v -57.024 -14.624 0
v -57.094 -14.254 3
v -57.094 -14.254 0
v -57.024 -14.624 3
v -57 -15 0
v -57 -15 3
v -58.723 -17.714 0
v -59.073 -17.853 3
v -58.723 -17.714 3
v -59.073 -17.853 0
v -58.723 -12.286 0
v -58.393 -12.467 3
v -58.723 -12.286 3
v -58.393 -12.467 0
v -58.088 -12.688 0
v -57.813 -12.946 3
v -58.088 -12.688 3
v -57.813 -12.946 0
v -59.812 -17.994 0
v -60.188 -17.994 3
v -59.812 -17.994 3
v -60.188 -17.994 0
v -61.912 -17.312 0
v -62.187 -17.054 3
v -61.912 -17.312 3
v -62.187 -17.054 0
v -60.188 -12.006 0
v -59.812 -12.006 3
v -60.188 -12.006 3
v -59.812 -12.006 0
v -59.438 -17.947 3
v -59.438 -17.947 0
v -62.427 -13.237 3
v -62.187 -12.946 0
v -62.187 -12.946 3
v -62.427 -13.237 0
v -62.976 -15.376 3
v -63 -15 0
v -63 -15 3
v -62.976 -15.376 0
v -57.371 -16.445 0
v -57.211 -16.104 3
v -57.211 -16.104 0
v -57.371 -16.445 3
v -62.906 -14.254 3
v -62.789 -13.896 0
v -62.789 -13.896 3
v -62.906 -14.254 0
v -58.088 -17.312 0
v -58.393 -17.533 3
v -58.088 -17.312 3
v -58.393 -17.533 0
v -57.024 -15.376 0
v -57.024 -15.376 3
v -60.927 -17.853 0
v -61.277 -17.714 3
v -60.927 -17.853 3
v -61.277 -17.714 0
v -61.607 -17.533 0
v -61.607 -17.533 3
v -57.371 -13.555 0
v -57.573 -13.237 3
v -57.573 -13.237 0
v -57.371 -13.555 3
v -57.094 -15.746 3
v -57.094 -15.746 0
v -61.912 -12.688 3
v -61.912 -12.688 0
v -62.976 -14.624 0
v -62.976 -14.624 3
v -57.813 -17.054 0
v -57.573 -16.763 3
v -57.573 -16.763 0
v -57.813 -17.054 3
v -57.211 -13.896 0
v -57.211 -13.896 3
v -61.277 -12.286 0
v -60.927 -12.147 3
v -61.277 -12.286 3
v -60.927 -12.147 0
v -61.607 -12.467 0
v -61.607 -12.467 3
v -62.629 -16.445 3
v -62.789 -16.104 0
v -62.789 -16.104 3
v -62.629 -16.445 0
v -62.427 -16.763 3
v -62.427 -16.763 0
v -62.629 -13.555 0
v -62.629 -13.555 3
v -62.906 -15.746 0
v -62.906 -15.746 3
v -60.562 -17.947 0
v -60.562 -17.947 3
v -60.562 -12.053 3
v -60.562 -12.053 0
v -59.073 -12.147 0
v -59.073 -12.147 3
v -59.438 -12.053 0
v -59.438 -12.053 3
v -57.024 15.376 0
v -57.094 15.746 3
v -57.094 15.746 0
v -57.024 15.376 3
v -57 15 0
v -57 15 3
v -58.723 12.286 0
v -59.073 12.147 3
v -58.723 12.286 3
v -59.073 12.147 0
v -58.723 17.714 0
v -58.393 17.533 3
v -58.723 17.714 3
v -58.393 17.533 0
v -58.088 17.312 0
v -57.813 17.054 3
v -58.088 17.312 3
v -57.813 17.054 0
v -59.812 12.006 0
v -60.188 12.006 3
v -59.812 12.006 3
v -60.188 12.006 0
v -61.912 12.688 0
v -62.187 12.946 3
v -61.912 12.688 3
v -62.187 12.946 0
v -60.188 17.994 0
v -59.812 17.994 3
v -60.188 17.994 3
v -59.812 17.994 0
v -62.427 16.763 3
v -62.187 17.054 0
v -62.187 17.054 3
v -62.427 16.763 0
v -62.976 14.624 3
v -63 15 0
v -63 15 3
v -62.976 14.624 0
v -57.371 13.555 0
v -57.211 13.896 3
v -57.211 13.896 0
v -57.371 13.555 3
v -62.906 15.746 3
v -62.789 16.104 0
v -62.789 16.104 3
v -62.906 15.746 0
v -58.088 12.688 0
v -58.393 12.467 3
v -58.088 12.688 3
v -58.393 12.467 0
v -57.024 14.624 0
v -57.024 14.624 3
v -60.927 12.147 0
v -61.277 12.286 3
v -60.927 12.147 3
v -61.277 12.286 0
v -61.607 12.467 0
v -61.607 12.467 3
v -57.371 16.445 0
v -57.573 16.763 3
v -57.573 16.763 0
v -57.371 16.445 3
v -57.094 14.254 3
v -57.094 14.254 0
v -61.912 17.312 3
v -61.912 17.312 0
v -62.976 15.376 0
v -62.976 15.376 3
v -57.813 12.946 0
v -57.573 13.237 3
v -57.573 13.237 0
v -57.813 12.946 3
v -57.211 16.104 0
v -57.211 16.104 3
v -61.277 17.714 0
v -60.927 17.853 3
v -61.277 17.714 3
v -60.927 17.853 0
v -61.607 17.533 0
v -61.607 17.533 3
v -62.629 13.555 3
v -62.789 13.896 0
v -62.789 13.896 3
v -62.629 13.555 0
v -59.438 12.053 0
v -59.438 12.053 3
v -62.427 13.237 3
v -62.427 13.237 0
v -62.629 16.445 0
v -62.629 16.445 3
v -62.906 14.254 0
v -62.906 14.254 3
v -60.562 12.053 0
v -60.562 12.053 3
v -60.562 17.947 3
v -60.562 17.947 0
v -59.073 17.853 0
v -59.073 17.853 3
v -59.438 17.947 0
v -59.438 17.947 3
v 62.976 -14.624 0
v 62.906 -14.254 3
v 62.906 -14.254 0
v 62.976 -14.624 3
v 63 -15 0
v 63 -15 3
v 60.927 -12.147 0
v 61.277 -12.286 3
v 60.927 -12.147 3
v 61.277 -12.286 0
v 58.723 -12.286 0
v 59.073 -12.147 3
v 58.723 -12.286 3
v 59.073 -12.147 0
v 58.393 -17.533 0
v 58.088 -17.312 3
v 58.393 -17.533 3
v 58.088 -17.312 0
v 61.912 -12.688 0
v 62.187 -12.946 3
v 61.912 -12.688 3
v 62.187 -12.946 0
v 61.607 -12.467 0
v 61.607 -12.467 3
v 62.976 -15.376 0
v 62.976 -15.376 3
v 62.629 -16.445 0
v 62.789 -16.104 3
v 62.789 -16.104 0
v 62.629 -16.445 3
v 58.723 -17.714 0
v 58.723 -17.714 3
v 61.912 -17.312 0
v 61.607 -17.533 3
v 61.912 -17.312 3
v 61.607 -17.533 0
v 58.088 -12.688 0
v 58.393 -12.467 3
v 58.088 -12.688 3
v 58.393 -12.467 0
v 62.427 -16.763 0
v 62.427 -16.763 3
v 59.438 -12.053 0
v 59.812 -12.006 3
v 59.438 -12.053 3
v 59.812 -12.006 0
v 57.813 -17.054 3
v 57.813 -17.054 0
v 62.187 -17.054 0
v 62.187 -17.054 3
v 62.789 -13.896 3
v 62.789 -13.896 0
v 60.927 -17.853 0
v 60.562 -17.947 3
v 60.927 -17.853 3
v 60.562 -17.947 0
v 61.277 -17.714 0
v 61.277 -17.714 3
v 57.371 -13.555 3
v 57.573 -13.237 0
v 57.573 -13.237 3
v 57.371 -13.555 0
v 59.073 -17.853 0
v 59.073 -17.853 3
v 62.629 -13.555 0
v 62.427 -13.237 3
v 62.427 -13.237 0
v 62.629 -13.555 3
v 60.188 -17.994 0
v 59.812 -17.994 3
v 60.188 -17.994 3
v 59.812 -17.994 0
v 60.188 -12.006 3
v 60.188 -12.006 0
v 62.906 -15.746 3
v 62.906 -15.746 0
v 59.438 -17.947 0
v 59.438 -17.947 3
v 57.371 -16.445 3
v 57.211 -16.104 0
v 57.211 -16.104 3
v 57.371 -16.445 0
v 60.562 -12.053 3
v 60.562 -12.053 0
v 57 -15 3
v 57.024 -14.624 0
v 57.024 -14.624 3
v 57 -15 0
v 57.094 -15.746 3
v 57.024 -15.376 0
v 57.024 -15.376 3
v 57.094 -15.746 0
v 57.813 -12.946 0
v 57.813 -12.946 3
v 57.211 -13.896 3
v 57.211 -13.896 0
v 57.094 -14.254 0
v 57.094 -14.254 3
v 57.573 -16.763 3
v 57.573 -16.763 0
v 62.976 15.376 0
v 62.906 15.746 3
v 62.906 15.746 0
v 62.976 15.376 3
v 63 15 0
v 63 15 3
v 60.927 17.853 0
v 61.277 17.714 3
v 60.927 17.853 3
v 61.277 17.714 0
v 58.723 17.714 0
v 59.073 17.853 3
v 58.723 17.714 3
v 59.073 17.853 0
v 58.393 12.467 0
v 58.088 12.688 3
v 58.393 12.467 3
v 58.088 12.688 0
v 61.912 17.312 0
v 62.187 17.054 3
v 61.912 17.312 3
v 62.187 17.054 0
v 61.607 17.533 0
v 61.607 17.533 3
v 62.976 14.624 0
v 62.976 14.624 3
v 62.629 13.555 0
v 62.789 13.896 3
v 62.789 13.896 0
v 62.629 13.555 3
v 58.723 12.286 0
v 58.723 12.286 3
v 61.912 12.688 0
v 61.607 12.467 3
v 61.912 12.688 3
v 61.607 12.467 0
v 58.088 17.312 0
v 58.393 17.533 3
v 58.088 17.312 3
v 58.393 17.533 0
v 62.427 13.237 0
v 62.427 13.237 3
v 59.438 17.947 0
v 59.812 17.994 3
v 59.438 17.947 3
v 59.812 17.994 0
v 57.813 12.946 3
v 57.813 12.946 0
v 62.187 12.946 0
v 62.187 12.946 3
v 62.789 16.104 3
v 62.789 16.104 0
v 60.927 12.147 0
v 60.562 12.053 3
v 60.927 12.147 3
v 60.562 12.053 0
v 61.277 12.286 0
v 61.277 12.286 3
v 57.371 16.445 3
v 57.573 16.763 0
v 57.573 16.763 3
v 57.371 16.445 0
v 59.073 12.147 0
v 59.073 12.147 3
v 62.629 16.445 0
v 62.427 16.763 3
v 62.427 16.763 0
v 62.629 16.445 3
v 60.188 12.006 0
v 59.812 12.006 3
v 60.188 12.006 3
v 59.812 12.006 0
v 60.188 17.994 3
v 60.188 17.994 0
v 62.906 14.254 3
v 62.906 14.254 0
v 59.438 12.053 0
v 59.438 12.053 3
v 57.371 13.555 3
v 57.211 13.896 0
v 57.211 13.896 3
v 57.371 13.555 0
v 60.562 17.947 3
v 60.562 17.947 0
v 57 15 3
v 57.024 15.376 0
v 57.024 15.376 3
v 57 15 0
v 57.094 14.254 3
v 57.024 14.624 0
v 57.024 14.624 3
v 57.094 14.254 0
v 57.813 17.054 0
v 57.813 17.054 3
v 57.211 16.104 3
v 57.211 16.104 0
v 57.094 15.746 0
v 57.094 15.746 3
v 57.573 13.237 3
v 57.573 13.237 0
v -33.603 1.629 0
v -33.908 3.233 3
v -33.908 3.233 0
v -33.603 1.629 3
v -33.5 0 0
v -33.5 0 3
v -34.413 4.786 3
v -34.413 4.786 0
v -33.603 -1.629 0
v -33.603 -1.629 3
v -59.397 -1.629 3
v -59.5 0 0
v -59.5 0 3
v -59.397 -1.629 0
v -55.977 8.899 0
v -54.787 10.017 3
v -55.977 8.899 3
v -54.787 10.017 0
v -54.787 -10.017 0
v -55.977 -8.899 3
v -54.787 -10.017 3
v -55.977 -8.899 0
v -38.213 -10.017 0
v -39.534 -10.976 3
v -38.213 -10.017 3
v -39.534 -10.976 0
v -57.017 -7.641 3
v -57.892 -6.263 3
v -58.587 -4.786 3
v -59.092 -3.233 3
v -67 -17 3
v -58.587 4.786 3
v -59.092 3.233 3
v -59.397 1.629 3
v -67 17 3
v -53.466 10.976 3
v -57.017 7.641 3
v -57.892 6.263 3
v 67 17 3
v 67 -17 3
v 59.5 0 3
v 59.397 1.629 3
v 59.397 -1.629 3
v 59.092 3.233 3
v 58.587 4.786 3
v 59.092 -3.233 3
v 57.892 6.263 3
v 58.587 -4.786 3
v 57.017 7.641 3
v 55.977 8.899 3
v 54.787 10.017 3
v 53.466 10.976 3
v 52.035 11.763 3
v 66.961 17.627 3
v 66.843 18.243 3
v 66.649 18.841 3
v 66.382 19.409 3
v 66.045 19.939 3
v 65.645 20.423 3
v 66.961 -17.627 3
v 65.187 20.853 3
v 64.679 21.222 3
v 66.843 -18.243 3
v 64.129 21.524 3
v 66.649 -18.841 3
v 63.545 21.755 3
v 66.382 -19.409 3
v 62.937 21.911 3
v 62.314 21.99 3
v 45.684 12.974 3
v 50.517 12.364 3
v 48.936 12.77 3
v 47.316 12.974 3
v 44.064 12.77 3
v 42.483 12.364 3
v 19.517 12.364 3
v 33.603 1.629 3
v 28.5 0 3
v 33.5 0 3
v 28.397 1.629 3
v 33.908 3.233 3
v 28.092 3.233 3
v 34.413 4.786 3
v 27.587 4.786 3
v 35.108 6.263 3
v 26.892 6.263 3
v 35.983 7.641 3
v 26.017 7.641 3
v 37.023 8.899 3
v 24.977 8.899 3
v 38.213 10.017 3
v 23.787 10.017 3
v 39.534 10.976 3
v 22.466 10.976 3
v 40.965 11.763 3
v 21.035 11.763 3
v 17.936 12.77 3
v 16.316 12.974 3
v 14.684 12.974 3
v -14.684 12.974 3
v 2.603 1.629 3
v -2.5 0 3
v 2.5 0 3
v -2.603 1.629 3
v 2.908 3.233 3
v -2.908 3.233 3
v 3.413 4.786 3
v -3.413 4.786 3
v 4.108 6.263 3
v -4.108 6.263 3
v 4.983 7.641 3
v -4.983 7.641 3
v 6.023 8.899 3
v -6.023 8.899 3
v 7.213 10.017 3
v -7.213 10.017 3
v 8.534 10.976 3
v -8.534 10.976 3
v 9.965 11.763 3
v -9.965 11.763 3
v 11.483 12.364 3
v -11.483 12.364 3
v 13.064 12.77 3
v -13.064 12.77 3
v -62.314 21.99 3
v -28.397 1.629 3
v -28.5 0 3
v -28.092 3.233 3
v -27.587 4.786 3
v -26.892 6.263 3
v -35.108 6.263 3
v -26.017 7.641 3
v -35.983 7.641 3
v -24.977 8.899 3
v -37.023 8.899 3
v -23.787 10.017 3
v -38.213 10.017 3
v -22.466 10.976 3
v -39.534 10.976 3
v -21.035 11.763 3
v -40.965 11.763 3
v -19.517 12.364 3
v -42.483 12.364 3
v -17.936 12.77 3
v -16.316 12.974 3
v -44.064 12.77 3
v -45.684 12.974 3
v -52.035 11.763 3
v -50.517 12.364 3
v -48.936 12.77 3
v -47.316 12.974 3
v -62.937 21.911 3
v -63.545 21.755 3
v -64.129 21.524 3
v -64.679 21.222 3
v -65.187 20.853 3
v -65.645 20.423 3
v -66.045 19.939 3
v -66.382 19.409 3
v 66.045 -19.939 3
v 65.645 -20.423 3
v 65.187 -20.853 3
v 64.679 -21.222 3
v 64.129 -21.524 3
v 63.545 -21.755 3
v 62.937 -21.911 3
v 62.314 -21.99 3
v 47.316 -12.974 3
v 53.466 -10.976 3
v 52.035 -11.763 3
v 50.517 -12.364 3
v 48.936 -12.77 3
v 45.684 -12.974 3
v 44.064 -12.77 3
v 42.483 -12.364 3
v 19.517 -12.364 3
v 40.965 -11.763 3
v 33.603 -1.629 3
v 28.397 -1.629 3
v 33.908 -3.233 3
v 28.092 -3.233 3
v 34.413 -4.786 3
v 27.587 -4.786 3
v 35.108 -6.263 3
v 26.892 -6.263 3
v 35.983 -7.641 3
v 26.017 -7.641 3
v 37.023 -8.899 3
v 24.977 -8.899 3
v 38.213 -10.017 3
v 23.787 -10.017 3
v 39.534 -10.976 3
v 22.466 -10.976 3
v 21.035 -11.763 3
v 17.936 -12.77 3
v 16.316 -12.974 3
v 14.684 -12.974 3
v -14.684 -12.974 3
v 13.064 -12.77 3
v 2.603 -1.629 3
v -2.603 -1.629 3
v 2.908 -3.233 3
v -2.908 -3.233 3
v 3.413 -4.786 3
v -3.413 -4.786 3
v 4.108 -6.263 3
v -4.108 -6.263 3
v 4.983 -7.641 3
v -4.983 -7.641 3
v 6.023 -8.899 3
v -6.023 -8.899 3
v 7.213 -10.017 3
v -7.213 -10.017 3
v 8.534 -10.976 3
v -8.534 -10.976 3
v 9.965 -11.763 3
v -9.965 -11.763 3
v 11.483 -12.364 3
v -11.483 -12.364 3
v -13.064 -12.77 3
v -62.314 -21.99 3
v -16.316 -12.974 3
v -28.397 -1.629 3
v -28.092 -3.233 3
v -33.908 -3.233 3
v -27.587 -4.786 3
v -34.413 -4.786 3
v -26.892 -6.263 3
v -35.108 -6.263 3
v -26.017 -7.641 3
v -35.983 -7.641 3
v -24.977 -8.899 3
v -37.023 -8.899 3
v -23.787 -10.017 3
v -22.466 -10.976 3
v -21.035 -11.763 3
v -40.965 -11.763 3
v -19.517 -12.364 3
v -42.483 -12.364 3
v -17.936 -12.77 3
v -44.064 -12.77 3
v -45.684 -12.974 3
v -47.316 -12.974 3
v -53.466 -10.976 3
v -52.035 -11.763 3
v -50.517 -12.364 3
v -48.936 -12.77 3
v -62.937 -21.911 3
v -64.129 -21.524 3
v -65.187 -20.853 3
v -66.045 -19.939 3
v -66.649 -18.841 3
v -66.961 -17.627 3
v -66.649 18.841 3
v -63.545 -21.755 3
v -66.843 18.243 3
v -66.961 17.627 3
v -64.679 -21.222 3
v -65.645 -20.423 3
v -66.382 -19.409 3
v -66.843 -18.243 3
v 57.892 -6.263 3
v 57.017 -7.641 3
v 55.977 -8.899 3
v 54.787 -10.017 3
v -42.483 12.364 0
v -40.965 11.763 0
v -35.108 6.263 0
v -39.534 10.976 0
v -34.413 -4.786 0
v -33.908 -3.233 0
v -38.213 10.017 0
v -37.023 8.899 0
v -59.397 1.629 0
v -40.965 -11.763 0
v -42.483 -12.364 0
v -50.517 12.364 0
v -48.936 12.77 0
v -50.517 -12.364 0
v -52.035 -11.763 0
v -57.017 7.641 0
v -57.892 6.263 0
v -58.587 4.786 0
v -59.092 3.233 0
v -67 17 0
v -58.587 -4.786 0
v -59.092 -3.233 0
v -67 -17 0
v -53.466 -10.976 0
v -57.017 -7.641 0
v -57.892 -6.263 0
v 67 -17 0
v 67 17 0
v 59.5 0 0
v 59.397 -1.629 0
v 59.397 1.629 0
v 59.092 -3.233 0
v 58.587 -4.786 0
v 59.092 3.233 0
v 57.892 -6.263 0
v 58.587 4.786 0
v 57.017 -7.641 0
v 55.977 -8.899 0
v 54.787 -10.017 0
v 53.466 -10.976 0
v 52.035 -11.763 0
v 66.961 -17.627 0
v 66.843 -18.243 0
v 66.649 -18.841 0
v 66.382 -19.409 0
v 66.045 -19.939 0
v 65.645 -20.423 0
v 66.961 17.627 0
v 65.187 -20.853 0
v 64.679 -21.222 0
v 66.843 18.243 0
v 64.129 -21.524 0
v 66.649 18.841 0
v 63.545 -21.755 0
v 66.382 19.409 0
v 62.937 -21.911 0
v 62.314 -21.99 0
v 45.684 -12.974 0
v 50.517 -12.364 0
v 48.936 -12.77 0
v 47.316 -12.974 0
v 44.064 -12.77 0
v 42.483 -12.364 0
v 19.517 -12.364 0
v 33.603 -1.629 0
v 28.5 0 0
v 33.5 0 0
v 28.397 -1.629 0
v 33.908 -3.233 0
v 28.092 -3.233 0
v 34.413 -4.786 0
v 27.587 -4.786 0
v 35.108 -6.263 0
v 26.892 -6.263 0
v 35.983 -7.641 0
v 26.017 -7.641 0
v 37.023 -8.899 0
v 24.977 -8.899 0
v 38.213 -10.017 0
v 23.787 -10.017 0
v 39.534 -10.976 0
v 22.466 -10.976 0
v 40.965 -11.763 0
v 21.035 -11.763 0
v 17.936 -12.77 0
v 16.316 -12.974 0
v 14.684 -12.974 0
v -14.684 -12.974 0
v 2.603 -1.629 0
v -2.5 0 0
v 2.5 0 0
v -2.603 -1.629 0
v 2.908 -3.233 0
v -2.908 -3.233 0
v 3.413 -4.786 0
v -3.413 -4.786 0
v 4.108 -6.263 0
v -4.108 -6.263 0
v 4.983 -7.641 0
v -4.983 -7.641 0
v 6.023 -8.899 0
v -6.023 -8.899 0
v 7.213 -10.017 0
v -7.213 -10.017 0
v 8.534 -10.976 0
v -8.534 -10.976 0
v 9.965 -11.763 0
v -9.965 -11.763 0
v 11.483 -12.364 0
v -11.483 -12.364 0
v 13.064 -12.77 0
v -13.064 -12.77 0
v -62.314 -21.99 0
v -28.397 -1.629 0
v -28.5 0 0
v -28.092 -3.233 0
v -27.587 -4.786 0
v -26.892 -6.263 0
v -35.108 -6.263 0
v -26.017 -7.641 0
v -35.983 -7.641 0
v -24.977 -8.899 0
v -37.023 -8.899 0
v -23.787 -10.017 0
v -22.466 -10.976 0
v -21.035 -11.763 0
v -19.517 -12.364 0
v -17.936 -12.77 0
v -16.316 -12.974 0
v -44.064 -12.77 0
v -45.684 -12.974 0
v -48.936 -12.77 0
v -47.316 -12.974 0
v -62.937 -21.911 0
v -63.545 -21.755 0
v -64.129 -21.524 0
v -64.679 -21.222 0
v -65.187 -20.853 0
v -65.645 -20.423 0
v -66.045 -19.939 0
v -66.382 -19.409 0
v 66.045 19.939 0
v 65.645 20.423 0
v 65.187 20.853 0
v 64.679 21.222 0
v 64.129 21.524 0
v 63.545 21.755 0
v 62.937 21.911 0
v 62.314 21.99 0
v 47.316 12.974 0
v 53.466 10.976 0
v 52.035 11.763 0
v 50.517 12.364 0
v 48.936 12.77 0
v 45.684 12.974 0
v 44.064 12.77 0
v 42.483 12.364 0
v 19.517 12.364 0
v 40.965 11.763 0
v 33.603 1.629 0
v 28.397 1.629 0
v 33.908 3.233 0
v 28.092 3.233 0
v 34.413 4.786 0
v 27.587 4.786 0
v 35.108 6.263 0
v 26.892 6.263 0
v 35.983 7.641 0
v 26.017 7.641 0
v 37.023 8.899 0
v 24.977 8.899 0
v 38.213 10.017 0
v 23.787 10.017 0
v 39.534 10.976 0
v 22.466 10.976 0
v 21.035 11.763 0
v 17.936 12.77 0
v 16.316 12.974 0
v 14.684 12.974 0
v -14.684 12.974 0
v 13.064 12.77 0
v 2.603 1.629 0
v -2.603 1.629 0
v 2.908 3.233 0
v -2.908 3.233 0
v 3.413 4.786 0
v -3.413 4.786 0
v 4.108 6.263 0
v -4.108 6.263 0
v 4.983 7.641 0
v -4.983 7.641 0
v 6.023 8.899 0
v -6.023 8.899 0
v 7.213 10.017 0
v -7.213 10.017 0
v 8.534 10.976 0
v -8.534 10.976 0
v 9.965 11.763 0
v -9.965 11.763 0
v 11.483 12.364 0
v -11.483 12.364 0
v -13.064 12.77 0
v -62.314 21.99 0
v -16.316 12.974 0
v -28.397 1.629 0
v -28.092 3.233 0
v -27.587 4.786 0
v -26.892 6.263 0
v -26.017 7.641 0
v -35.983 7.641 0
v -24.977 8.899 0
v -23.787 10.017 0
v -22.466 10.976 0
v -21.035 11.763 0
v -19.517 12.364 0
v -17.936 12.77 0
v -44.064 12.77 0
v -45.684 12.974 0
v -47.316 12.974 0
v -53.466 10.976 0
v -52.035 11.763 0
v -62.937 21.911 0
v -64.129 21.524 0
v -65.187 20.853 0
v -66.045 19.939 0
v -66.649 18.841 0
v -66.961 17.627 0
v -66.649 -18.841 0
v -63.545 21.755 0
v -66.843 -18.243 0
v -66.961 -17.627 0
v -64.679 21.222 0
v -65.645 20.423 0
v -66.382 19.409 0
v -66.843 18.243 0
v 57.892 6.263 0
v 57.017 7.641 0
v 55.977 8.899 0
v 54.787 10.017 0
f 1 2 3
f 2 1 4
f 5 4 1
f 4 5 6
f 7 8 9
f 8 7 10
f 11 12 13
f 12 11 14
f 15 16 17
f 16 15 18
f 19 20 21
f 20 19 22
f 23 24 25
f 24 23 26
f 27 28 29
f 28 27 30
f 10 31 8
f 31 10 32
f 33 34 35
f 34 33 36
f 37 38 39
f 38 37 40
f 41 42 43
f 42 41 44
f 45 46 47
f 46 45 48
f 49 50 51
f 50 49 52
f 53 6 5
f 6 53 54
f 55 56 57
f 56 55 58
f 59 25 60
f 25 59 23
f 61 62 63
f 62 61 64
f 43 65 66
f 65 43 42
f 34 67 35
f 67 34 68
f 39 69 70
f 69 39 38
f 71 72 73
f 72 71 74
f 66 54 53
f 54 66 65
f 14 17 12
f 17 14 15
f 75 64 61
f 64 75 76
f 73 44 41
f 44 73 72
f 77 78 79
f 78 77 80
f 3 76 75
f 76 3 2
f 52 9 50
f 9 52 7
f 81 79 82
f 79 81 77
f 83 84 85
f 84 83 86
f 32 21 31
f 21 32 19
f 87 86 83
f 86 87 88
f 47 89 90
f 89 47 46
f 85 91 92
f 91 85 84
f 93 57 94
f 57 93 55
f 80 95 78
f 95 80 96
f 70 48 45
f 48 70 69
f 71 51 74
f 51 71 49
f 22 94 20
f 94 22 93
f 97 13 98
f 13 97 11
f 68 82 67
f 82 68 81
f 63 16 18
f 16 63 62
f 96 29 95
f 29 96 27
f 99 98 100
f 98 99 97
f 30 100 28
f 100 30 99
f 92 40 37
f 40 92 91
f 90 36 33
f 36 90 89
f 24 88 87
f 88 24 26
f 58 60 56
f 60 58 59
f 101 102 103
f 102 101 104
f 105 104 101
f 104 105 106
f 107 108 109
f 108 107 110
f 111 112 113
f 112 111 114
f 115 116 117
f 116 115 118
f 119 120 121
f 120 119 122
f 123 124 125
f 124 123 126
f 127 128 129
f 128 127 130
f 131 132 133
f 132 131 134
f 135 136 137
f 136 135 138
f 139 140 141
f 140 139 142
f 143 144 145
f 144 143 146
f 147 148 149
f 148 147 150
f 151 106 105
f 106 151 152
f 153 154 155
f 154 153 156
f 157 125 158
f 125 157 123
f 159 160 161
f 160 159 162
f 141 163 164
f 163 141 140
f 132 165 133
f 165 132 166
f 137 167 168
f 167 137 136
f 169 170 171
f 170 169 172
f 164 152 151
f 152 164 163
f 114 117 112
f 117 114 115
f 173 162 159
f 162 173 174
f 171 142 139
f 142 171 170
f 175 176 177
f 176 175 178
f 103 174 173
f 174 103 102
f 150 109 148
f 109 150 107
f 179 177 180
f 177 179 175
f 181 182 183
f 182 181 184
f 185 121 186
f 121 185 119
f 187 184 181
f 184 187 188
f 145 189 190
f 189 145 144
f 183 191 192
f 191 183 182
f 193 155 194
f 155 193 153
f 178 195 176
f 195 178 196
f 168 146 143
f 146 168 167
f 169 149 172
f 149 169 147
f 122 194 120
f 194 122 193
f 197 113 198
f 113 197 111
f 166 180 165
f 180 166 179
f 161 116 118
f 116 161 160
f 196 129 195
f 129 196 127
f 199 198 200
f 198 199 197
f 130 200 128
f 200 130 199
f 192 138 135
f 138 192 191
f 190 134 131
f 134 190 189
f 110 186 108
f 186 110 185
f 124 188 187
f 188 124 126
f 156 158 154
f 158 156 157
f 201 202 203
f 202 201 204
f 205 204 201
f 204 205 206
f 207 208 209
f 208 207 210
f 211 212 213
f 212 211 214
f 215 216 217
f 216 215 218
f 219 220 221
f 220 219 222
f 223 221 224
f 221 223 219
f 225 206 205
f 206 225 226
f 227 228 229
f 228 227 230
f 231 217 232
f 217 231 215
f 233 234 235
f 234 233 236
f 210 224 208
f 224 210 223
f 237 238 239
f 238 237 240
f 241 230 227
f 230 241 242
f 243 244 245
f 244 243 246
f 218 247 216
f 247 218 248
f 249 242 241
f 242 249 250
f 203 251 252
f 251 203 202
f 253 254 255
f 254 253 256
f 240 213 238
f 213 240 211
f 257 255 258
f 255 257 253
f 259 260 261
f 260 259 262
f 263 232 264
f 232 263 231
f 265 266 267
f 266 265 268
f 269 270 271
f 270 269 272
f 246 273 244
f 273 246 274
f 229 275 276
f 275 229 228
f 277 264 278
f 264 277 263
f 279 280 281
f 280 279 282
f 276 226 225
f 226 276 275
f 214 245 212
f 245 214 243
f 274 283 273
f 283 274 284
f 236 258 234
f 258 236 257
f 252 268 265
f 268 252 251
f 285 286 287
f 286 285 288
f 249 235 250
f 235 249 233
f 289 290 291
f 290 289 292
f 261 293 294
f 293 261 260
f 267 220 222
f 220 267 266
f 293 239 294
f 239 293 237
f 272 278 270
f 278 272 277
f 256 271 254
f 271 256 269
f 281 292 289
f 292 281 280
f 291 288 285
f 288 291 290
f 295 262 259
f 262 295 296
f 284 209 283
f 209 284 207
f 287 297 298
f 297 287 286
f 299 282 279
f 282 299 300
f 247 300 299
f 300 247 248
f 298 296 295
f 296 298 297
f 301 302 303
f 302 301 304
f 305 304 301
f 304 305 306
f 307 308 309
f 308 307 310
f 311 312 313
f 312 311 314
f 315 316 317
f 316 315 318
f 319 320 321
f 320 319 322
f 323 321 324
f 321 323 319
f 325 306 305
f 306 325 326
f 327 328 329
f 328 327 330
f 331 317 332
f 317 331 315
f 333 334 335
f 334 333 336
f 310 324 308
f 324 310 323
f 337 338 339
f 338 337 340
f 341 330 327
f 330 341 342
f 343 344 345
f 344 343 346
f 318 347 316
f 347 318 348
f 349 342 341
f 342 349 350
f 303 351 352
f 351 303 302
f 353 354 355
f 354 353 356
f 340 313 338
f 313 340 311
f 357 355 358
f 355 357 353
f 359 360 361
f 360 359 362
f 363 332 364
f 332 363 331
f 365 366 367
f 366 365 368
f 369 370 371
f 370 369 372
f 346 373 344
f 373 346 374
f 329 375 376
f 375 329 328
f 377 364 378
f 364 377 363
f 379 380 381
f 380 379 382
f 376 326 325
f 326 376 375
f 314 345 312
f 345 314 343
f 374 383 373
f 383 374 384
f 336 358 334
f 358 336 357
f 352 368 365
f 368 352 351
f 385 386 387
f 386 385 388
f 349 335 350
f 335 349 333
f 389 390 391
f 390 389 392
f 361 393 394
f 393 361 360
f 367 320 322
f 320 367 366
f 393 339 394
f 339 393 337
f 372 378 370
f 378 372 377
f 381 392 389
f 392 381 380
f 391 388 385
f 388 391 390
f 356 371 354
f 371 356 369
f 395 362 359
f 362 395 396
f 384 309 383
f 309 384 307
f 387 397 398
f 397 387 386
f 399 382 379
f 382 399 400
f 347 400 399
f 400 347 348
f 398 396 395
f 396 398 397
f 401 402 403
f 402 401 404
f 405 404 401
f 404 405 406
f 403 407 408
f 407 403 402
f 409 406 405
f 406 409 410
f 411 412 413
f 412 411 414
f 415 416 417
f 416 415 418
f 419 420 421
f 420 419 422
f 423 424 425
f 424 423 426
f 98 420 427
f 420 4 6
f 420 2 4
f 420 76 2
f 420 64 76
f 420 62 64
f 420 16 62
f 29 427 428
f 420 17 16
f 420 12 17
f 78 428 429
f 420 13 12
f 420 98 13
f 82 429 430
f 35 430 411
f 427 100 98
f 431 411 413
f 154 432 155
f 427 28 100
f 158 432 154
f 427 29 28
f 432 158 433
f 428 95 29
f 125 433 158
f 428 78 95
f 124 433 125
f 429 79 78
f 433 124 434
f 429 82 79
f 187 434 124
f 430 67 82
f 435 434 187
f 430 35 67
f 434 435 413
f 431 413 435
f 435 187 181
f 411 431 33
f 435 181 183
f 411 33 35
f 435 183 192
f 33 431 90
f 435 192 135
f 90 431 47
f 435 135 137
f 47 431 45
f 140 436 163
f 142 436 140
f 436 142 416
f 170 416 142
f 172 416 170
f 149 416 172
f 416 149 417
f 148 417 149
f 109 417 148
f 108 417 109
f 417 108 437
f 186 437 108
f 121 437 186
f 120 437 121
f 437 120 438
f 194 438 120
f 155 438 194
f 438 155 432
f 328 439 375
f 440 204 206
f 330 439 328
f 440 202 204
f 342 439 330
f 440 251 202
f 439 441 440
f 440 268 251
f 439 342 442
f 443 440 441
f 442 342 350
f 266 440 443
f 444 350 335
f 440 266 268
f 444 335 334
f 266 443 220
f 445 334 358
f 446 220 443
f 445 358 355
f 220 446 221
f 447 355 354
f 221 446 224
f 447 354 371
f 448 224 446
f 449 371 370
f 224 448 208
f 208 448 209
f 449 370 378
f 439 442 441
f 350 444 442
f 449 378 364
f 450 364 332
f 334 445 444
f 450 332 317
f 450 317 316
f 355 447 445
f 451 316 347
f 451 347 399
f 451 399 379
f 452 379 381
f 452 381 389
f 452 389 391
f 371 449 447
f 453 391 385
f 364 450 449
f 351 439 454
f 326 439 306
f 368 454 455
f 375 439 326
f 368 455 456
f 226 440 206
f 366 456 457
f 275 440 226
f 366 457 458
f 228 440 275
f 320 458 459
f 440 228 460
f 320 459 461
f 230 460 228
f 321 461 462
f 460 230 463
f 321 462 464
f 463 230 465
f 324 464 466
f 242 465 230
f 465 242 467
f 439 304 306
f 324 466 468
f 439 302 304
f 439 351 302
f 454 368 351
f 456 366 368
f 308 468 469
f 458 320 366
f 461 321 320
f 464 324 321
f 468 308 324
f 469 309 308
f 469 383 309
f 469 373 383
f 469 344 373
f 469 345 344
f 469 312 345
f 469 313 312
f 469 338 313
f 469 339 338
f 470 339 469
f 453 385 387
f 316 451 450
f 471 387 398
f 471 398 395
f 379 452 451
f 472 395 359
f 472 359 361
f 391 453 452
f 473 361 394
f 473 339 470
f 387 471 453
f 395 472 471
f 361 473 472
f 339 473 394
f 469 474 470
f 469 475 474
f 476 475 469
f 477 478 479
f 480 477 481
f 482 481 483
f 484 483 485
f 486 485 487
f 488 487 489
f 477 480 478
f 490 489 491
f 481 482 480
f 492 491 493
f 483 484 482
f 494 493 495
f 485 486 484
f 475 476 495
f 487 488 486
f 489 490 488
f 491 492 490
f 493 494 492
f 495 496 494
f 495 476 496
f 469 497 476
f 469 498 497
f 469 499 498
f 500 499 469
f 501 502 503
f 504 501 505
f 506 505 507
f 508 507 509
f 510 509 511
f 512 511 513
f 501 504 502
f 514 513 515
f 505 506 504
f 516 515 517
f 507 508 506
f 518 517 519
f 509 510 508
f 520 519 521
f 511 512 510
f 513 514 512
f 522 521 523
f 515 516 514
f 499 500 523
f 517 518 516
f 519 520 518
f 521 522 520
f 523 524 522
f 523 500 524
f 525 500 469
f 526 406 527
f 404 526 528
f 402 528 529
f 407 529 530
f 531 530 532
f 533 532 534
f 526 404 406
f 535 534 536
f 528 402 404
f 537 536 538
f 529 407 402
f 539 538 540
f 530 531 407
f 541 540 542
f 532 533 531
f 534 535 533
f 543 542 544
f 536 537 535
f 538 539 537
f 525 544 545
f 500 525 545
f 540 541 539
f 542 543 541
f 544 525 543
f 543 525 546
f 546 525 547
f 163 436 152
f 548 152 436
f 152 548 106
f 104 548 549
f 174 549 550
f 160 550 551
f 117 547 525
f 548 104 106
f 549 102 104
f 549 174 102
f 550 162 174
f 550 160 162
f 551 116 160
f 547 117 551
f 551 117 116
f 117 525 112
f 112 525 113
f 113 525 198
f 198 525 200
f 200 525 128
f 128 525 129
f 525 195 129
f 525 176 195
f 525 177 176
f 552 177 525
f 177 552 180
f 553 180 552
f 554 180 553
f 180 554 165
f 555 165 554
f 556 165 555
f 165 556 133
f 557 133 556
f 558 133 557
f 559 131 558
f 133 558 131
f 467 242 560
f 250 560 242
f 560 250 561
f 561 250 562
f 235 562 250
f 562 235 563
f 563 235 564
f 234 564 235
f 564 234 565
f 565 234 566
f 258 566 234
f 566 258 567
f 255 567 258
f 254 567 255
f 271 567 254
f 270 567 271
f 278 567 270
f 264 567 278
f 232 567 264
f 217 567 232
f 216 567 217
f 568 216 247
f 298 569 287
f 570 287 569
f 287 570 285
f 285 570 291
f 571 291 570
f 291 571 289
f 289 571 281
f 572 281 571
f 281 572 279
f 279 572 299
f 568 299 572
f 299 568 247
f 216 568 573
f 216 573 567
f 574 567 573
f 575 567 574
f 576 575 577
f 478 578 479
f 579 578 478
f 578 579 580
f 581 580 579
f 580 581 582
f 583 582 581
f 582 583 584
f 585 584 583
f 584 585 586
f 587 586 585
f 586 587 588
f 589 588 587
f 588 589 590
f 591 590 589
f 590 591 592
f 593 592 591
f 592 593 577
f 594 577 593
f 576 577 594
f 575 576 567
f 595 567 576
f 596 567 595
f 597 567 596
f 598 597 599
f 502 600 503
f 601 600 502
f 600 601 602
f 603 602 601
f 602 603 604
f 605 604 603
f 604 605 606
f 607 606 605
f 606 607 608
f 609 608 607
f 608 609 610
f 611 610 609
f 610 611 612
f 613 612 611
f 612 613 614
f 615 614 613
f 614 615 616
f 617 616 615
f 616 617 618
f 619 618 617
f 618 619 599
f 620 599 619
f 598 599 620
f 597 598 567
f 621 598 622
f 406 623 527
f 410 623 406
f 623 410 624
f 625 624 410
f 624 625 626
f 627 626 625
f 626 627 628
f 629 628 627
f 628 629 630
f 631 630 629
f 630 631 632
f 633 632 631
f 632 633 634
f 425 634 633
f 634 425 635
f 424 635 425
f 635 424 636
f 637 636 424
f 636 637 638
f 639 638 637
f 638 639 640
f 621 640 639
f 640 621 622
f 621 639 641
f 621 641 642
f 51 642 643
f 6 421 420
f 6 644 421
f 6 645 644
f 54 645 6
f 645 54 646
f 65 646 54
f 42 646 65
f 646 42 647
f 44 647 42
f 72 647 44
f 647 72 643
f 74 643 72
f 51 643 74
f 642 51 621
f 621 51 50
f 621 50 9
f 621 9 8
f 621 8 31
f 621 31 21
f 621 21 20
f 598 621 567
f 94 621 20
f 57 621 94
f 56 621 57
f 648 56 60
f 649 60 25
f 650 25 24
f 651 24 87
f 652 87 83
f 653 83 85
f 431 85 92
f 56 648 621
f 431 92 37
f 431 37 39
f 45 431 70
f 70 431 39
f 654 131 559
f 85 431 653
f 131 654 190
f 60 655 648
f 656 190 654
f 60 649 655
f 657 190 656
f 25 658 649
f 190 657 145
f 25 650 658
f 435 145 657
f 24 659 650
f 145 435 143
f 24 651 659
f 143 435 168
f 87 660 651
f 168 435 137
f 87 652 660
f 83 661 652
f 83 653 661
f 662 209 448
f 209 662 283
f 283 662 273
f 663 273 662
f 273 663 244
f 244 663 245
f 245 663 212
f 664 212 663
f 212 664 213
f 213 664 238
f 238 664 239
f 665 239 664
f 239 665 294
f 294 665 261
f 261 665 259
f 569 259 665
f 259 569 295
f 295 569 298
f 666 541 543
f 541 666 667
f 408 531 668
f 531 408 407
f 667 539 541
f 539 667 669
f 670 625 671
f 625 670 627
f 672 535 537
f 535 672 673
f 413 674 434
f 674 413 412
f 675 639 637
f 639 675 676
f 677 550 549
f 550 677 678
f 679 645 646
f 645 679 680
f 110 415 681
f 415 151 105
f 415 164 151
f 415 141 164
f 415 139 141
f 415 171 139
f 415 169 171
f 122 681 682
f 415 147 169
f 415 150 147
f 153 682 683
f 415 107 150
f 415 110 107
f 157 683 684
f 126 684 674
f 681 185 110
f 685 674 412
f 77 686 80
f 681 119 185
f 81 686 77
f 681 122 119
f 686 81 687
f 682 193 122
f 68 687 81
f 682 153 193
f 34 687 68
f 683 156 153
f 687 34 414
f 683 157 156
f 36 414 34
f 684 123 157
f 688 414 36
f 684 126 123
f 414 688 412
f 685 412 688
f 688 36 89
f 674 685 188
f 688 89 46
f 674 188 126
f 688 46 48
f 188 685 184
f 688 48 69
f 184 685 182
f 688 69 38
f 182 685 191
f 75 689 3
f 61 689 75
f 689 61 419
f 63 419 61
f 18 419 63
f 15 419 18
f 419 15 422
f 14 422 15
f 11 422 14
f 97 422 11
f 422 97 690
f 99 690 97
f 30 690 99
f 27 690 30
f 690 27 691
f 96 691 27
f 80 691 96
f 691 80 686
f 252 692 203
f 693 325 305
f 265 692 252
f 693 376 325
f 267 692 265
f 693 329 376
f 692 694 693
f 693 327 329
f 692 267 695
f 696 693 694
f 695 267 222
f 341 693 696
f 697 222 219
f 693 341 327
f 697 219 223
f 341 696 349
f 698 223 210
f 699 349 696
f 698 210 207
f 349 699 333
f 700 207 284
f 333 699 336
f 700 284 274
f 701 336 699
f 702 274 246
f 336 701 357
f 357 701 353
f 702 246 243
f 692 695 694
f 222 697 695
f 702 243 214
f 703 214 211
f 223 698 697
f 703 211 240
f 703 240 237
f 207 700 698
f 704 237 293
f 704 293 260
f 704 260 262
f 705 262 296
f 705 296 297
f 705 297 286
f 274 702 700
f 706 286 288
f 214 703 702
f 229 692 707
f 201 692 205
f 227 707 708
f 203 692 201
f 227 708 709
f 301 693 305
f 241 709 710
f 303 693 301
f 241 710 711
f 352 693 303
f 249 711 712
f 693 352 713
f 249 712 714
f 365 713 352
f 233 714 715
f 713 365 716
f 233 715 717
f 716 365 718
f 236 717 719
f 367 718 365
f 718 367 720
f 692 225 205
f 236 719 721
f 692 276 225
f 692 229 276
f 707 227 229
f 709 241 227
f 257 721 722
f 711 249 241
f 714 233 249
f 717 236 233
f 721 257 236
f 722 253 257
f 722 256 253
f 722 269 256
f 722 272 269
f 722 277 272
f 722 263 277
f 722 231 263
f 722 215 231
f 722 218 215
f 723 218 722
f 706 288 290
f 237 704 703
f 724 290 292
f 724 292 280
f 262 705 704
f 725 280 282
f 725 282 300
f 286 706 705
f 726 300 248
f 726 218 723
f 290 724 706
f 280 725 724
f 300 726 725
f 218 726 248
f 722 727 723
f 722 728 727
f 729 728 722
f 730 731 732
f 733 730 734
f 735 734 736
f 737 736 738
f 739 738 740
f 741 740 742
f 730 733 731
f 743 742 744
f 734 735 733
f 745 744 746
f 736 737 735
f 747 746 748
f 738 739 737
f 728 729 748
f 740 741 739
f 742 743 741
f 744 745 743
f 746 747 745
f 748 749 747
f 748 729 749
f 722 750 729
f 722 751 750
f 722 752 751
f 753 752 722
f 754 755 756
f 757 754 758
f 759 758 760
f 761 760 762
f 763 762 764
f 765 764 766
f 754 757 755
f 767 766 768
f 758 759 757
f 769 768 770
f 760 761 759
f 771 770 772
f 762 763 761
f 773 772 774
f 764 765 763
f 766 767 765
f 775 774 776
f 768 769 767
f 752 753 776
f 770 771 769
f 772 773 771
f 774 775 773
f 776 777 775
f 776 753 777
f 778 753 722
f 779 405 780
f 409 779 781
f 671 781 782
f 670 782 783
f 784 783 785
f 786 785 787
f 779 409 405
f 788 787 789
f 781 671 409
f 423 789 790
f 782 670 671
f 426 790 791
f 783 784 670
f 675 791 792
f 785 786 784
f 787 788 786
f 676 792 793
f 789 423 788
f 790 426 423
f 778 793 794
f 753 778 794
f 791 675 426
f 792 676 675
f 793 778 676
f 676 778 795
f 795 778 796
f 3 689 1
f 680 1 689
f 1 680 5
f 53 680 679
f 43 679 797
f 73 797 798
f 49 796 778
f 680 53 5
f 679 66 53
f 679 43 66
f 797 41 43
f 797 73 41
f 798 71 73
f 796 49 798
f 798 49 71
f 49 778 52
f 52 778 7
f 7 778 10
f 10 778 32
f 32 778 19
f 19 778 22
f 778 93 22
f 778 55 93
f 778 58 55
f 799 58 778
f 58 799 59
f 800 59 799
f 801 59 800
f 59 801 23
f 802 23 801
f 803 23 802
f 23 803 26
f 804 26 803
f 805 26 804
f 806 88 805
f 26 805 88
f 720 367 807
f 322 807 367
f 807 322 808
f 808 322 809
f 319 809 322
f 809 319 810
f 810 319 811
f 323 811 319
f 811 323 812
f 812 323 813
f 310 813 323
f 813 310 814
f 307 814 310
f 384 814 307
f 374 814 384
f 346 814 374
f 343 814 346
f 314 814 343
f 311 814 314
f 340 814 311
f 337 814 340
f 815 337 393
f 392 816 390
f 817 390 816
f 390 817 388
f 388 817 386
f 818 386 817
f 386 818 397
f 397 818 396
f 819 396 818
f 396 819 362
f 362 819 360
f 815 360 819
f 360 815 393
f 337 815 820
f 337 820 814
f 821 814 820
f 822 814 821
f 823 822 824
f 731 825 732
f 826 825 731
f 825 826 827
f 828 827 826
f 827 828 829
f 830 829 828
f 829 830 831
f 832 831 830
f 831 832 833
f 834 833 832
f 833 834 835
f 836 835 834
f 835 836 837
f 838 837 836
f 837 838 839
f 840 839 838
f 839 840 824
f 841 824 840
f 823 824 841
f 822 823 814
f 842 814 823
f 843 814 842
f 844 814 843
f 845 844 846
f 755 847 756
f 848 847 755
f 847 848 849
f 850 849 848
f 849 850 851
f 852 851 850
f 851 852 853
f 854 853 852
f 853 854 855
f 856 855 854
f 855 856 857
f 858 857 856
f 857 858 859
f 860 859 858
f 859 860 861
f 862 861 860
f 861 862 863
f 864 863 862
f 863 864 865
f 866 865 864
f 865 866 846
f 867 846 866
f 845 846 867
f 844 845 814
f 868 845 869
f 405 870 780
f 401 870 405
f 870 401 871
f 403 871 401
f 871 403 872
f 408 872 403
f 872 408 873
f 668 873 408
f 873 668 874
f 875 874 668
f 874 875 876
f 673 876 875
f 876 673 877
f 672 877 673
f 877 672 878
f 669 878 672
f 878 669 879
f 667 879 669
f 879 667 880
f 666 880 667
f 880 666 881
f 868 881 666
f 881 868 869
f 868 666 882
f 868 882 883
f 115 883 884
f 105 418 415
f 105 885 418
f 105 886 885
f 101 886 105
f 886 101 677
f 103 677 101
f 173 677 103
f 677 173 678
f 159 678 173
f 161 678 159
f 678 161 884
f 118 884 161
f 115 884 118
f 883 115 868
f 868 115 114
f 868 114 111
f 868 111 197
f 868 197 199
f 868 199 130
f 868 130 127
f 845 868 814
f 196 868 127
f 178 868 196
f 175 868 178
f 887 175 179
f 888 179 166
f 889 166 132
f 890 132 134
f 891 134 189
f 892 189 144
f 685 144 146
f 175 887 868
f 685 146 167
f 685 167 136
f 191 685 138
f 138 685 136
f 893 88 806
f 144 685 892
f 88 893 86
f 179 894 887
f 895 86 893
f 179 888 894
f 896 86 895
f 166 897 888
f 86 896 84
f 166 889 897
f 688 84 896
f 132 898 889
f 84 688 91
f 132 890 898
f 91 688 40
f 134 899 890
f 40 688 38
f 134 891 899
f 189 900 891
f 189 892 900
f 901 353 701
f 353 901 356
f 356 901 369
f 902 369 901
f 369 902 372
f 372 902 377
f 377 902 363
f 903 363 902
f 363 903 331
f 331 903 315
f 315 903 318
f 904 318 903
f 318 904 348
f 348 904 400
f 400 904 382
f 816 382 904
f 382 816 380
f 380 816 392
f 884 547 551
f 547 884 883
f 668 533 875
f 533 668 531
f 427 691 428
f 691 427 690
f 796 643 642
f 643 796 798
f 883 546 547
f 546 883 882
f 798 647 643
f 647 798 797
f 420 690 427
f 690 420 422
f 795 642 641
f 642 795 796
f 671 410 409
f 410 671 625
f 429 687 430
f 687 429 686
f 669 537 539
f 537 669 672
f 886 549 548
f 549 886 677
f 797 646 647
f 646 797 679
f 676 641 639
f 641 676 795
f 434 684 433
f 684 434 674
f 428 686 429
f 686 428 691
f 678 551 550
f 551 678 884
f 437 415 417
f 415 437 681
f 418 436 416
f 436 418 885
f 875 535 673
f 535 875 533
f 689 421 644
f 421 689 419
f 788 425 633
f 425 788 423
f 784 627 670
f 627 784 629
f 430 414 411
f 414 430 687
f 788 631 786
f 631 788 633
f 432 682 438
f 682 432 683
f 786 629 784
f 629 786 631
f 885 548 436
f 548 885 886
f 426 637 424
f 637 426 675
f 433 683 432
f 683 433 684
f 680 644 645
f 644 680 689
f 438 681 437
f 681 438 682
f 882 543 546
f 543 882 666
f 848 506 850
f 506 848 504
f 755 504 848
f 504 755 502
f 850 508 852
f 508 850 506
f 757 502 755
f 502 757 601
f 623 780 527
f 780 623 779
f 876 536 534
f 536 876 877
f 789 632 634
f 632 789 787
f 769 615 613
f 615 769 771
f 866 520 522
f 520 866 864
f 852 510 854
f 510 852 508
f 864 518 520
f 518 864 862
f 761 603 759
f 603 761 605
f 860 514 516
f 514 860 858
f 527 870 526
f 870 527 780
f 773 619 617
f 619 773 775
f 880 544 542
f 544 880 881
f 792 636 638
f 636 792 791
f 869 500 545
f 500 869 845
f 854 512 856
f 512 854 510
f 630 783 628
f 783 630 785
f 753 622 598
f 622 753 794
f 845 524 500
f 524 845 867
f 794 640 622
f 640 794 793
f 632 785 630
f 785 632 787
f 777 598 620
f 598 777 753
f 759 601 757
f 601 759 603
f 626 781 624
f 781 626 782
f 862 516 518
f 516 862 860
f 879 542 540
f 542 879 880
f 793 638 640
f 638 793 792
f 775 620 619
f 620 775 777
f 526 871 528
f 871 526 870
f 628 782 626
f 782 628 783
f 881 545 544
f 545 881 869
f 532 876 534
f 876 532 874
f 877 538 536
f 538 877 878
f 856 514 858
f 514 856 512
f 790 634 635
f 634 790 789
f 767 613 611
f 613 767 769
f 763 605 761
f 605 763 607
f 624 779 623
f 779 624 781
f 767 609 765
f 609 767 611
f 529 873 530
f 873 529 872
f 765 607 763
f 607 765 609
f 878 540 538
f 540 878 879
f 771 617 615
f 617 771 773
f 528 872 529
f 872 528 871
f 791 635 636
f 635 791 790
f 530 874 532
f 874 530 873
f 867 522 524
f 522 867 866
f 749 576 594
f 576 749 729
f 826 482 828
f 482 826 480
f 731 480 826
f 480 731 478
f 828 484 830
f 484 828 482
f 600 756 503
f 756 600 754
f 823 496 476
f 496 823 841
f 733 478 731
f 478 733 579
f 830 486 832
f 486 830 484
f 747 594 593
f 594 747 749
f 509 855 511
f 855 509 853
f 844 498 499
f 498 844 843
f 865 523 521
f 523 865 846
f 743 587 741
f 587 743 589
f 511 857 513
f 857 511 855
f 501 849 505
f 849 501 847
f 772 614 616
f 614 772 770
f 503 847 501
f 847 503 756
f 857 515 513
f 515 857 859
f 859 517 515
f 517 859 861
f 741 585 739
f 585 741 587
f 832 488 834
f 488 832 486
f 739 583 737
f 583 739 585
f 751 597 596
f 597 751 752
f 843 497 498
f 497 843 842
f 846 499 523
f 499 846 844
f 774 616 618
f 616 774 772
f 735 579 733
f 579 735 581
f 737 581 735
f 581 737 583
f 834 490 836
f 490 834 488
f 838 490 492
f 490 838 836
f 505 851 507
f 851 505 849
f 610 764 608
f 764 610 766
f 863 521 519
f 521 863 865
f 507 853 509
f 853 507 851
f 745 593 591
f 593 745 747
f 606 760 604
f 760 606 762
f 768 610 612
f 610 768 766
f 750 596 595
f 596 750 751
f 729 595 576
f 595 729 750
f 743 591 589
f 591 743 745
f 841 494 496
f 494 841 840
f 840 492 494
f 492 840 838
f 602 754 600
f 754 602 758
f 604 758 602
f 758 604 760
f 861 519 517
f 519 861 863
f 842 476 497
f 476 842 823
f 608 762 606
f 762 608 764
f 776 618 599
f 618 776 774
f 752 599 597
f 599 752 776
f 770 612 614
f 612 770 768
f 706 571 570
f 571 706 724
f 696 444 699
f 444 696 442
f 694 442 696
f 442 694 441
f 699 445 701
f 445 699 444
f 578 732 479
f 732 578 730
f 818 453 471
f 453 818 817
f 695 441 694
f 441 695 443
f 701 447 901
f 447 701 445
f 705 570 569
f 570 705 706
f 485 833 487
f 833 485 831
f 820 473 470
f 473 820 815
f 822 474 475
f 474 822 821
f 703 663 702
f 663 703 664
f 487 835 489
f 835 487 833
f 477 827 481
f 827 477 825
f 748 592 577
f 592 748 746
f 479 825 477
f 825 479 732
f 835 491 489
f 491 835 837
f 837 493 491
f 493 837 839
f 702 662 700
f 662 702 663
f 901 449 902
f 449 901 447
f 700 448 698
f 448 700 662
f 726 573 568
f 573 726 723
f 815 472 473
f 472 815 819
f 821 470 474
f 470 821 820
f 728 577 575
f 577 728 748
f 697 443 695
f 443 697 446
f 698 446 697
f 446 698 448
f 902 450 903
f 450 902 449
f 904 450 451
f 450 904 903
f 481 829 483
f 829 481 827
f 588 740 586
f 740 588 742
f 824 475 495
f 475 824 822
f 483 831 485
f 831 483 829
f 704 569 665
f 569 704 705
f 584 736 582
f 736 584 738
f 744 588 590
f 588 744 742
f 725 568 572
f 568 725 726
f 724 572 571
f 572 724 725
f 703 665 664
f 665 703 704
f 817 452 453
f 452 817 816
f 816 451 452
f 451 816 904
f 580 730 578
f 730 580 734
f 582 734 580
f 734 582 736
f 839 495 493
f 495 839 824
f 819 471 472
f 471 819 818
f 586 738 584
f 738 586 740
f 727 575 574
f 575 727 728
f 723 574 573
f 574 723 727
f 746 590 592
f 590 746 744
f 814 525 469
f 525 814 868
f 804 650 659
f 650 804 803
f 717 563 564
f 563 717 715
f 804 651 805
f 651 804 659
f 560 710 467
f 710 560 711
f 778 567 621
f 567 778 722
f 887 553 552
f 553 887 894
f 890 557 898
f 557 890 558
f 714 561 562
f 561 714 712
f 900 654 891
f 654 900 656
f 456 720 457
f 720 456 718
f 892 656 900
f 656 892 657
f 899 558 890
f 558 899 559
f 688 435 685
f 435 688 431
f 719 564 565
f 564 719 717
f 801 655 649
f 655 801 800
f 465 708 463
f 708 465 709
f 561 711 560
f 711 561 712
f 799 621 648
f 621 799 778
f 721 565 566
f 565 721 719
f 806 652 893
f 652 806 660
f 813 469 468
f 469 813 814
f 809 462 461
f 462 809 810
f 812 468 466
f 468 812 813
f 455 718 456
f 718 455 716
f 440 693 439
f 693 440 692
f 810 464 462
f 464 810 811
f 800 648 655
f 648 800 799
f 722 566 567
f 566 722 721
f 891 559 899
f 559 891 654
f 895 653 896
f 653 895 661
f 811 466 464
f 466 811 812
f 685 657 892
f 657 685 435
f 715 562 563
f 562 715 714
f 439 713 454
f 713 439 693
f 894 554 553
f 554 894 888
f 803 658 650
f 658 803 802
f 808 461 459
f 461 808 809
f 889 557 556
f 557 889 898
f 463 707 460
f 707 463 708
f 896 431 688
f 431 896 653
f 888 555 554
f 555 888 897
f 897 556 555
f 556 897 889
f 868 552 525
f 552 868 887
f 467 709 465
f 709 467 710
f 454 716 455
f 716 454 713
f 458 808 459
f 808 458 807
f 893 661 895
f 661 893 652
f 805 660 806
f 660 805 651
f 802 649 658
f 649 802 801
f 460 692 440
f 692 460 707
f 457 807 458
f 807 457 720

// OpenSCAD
$fn = 50;


difference() {
	union() {
		hull() {
			translate(v = [-62.0000000000, 17.0000000000, 0]) {
				cylinder(h = 3, r = 5);
			}
			translate(v = [62.0000000000, 17.0000000000, 0]) {
				cylinder(h = 3, r = 5);
			}
			translate(v = [-62.0000000000, -17.0000000000, 0]) {
				cylinder(h = 3, r = 5);
			}
			translate(v = [62.0000000000, -17.0000000000, 0]) {
				cylinder(h = 3, r = 5);
			}
		}
	}
	union() {
		#translate(v = [-60.0000000000, -15.0000000000, -100.0000000000]) {
			cylinder(h = 200, r = 3.0000000000);
		}
		#translate(v = [-60.0000000000, 15.0000000000, -100.0000000000]) {
			cylinder(h = 200, r = 3.0000000000);
		}
		#translate(v = [60.0000000000, -15.0000000000, -100.0000000000]) {
			cylinder(h = 200, r = 3.0000000000);
		}
		#translate(v = [60.0000000000, 15.0000000000, -100.0000000000]) {
			cylinder(h = 200, r = 3.0000000000);
		}
		#translate(v = [-46.5000000000, 0, 0]) {
			cylinder(h = 3, r = 13.0000000000);
		}
		#translate(v = [-15.5000000000, 0, 0]) {
			cylinder(h = 3, r = 13.0000000000);
		}
		#translate(v = [15.5000000000, 0, 0]) {
			cylinder(h = 3, r = 13.0000000000);
		}
		#translate(v = [46.5000000000, 0, 0]) {
			cylinder(h = 3, r = 13.0000000000);
		}
	}
}
